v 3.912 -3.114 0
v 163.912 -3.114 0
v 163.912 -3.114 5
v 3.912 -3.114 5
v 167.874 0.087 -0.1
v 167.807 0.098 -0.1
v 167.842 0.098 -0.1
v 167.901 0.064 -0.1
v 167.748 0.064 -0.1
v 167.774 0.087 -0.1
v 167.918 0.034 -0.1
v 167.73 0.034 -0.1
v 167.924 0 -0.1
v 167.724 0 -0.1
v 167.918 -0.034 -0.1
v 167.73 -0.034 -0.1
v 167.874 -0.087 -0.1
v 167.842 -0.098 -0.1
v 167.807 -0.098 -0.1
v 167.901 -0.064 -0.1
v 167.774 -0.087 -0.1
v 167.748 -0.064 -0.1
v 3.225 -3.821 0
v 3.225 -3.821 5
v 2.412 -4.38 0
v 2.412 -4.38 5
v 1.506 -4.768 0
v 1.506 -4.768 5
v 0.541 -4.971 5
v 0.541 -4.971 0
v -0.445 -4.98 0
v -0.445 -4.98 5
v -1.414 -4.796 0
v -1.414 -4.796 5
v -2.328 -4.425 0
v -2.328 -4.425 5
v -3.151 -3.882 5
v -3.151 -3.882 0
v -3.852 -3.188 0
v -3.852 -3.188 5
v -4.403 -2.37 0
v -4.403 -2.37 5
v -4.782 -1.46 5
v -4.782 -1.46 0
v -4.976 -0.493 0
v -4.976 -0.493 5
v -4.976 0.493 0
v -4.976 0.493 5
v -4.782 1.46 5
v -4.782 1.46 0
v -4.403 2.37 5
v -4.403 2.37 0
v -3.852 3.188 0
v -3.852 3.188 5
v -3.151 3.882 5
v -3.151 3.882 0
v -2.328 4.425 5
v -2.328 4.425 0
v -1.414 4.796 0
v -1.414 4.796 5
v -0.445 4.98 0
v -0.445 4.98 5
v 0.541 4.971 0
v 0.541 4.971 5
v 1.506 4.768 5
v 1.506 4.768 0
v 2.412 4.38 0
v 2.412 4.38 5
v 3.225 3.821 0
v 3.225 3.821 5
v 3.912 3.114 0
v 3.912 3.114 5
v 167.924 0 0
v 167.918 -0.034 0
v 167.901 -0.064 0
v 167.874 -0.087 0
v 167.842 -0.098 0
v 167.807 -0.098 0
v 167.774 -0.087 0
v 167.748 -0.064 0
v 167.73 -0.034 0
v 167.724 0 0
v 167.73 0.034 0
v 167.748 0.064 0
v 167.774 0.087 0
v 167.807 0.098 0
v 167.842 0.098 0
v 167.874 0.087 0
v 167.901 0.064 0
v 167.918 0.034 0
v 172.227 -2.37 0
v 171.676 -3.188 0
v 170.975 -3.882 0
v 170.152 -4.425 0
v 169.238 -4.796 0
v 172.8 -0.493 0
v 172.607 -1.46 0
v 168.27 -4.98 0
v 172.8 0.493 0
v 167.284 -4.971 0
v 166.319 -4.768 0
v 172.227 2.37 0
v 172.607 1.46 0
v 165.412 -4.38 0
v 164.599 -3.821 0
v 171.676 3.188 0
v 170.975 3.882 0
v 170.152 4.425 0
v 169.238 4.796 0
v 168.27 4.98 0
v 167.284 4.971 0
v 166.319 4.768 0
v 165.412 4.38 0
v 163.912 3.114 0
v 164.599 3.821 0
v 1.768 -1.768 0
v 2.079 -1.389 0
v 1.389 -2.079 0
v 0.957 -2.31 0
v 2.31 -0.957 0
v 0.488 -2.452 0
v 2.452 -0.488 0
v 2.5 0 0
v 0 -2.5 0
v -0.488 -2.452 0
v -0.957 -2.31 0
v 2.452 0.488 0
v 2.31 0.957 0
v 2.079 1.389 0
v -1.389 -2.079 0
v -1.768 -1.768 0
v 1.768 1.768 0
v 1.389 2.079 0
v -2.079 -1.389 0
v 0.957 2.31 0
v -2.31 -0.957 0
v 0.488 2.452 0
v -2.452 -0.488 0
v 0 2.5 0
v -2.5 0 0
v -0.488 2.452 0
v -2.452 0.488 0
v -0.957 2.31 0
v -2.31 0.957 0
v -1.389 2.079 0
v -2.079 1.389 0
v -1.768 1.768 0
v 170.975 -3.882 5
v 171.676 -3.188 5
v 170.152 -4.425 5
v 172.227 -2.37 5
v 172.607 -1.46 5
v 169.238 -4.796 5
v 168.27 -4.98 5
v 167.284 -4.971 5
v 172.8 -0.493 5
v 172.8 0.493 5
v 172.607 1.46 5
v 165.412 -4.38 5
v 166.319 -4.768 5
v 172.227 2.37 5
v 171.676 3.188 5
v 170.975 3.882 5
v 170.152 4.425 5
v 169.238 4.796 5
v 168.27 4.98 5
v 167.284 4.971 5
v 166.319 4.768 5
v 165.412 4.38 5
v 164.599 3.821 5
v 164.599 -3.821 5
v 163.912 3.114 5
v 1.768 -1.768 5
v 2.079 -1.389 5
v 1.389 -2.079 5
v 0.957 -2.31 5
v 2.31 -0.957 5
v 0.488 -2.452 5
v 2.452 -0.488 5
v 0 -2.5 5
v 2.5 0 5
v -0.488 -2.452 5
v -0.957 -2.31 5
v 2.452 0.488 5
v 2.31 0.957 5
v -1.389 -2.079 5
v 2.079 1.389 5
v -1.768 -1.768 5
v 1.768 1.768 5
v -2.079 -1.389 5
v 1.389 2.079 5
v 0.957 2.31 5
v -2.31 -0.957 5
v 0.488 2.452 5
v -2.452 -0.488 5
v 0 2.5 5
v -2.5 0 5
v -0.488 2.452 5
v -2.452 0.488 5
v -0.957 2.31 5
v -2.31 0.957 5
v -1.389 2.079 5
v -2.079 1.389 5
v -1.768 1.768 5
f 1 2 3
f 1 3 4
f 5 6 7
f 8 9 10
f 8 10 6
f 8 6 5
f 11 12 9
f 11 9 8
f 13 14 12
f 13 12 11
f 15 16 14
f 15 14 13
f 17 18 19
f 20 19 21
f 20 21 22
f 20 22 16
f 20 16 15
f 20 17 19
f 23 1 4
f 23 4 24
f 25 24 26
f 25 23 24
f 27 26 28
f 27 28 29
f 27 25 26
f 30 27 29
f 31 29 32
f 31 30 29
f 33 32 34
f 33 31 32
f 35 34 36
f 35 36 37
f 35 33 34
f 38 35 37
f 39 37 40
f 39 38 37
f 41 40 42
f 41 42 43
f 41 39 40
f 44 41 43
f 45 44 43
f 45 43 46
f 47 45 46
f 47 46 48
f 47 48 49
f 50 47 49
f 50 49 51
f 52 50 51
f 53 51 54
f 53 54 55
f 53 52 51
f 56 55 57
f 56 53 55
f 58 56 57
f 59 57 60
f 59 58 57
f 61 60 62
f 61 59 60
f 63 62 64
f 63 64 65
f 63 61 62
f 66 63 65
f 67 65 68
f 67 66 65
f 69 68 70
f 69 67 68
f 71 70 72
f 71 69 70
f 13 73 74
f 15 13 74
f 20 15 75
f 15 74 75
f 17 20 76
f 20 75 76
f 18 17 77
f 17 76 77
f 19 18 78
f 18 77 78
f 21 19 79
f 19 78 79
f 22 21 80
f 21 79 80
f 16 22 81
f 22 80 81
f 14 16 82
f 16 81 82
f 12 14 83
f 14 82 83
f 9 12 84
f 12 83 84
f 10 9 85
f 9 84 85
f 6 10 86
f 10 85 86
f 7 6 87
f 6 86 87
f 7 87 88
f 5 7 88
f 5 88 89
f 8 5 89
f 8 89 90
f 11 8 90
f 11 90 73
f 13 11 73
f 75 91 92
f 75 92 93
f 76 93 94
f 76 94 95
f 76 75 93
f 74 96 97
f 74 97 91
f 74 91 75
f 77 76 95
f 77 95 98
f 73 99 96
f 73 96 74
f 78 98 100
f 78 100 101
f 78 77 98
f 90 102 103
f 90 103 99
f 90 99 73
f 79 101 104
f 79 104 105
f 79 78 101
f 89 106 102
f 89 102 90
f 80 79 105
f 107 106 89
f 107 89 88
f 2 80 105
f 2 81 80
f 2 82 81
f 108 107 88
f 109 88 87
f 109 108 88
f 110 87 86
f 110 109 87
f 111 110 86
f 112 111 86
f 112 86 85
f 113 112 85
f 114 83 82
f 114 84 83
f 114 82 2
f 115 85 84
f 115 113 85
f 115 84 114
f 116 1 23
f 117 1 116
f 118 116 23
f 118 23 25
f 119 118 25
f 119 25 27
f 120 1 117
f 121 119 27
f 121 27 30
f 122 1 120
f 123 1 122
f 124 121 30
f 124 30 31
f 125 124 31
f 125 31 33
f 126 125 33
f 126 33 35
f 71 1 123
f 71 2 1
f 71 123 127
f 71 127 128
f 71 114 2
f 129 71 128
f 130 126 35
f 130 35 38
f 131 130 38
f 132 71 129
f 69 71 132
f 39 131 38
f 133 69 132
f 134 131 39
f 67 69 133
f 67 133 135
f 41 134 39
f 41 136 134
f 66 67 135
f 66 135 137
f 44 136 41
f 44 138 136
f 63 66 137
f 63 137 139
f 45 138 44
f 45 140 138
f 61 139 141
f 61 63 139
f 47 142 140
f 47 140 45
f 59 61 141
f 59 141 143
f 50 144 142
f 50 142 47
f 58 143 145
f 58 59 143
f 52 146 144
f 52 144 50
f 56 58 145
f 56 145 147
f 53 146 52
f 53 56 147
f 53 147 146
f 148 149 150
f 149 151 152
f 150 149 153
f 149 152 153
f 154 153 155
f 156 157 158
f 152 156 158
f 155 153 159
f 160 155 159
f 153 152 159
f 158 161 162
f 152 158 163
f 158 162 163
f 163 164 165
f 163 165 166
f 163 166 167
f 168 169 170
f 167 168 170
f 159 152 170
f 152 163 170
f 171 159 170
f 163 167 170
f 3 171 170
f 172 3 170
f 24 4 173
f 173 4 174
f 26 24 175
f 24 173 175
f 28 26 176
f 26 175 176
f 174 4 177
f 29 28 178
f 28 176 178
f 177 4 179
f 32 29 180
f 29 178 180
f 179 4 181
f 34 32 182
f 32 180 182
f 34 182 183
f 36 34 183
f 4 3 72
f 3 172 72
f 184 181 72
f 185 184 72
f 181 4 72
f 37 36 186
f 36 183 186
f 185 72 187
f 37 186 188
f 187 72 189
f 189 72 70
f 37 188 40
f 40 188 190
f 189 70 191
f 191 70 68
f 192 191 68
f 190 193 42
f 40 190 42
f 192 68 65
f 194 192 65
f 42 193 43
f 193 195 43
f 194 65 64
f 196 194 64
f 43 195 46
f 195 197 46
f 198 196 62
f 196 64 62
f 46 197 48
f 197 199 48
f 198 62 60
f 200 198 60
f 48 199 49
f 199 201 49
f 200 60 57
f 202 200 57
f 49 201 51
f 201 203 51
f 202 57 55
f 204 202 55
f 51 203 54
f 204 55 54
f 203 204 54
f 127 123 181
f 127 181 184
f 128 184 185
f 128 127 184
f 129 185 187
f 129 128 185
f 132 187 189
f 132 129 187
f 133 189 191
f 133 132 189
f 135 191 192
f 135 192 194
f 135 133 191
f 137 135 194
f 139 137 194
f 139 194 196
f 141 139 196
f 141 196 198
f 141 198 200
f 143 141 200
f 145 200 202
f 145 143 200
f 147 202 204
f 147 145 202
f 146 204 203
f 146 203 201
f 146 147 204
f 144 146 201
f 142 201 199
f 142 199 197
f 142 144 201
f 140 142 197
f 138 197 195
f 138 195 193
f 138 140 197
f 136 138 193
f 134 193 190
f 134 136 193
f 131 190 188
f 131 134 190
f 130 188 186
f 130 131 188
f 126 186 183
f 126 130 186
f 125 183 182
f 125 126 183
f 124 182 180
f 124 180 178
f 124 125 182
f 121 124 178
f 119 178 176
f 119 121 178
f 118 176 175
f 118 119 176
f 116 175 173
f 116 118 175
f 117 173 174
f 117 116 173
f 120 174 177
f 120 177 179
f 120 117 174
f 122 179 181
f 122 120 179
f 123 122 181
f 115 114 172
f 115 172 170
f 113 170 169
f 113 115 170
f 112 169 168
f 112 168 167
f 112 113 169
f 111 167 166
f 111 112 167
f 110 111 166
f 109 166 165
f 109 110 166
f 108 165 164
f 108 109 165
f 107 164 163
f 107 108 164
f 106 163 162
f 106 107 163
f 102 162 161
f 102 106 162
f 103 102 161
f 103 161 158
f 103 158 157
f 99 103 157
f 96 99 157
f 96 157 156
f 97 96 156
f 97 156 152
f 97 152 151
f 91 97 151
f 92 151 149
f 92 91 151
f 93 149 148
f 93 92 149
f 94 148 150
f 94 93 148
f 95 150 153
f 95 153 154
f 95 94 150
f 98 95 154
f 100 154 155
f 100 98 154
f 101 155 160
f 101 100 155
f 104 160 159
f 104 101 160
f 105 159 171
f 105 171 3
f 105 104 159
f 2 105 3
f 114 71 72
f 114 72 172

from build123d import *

# Parameters (mm, degrees)
SKETCH1_R           = 2.5
BOSS_EXTRUDE1_DEPTH = 5
SKETCH3_R           = 0.1
BOSS_EXTRUDE2_DEPTH = 0.1


with BuildPart() as part:
    # Sketch1 → Boss-Extrude1 (new body)
    with BuildSketch(Plane.XY):
        with BuildLine():
            Line((3.912222702, 3.113601376), (163.912222702, 3.113601376))
            ThreePointArc((163.912222702, 3.113601376), (172.824445404, 0), (163.912222702, -3.113601376))
            Line((163.912222702, -3.113601376), (3.912222702, -3.113601376))
            ThreePointArc((3.912222702, -3.113601376), (-5, 0), (3.912222702, 3.113601376))
        make_face()
        Circle(SKETCH1_R, mode=Mode.SUBTRACT)
    extrude(amount=BOSS_EXTRUDE1_DEPTH)

    # Sketch3 → Boss-Extrude2 (add)
    with BuildSketch(Plane(origin=(0, 0, 0), x_dir=(-1, 0, 0), z_dir=(0, 0, -1))):
        with Locations(Location((-167.824445404, 0, 0), (0, 0, 180))):
            Circle(SKETCH3_R)
    extrude(amount=BOSS_EXTRUDE2_DEPTH)


solid = part.part
